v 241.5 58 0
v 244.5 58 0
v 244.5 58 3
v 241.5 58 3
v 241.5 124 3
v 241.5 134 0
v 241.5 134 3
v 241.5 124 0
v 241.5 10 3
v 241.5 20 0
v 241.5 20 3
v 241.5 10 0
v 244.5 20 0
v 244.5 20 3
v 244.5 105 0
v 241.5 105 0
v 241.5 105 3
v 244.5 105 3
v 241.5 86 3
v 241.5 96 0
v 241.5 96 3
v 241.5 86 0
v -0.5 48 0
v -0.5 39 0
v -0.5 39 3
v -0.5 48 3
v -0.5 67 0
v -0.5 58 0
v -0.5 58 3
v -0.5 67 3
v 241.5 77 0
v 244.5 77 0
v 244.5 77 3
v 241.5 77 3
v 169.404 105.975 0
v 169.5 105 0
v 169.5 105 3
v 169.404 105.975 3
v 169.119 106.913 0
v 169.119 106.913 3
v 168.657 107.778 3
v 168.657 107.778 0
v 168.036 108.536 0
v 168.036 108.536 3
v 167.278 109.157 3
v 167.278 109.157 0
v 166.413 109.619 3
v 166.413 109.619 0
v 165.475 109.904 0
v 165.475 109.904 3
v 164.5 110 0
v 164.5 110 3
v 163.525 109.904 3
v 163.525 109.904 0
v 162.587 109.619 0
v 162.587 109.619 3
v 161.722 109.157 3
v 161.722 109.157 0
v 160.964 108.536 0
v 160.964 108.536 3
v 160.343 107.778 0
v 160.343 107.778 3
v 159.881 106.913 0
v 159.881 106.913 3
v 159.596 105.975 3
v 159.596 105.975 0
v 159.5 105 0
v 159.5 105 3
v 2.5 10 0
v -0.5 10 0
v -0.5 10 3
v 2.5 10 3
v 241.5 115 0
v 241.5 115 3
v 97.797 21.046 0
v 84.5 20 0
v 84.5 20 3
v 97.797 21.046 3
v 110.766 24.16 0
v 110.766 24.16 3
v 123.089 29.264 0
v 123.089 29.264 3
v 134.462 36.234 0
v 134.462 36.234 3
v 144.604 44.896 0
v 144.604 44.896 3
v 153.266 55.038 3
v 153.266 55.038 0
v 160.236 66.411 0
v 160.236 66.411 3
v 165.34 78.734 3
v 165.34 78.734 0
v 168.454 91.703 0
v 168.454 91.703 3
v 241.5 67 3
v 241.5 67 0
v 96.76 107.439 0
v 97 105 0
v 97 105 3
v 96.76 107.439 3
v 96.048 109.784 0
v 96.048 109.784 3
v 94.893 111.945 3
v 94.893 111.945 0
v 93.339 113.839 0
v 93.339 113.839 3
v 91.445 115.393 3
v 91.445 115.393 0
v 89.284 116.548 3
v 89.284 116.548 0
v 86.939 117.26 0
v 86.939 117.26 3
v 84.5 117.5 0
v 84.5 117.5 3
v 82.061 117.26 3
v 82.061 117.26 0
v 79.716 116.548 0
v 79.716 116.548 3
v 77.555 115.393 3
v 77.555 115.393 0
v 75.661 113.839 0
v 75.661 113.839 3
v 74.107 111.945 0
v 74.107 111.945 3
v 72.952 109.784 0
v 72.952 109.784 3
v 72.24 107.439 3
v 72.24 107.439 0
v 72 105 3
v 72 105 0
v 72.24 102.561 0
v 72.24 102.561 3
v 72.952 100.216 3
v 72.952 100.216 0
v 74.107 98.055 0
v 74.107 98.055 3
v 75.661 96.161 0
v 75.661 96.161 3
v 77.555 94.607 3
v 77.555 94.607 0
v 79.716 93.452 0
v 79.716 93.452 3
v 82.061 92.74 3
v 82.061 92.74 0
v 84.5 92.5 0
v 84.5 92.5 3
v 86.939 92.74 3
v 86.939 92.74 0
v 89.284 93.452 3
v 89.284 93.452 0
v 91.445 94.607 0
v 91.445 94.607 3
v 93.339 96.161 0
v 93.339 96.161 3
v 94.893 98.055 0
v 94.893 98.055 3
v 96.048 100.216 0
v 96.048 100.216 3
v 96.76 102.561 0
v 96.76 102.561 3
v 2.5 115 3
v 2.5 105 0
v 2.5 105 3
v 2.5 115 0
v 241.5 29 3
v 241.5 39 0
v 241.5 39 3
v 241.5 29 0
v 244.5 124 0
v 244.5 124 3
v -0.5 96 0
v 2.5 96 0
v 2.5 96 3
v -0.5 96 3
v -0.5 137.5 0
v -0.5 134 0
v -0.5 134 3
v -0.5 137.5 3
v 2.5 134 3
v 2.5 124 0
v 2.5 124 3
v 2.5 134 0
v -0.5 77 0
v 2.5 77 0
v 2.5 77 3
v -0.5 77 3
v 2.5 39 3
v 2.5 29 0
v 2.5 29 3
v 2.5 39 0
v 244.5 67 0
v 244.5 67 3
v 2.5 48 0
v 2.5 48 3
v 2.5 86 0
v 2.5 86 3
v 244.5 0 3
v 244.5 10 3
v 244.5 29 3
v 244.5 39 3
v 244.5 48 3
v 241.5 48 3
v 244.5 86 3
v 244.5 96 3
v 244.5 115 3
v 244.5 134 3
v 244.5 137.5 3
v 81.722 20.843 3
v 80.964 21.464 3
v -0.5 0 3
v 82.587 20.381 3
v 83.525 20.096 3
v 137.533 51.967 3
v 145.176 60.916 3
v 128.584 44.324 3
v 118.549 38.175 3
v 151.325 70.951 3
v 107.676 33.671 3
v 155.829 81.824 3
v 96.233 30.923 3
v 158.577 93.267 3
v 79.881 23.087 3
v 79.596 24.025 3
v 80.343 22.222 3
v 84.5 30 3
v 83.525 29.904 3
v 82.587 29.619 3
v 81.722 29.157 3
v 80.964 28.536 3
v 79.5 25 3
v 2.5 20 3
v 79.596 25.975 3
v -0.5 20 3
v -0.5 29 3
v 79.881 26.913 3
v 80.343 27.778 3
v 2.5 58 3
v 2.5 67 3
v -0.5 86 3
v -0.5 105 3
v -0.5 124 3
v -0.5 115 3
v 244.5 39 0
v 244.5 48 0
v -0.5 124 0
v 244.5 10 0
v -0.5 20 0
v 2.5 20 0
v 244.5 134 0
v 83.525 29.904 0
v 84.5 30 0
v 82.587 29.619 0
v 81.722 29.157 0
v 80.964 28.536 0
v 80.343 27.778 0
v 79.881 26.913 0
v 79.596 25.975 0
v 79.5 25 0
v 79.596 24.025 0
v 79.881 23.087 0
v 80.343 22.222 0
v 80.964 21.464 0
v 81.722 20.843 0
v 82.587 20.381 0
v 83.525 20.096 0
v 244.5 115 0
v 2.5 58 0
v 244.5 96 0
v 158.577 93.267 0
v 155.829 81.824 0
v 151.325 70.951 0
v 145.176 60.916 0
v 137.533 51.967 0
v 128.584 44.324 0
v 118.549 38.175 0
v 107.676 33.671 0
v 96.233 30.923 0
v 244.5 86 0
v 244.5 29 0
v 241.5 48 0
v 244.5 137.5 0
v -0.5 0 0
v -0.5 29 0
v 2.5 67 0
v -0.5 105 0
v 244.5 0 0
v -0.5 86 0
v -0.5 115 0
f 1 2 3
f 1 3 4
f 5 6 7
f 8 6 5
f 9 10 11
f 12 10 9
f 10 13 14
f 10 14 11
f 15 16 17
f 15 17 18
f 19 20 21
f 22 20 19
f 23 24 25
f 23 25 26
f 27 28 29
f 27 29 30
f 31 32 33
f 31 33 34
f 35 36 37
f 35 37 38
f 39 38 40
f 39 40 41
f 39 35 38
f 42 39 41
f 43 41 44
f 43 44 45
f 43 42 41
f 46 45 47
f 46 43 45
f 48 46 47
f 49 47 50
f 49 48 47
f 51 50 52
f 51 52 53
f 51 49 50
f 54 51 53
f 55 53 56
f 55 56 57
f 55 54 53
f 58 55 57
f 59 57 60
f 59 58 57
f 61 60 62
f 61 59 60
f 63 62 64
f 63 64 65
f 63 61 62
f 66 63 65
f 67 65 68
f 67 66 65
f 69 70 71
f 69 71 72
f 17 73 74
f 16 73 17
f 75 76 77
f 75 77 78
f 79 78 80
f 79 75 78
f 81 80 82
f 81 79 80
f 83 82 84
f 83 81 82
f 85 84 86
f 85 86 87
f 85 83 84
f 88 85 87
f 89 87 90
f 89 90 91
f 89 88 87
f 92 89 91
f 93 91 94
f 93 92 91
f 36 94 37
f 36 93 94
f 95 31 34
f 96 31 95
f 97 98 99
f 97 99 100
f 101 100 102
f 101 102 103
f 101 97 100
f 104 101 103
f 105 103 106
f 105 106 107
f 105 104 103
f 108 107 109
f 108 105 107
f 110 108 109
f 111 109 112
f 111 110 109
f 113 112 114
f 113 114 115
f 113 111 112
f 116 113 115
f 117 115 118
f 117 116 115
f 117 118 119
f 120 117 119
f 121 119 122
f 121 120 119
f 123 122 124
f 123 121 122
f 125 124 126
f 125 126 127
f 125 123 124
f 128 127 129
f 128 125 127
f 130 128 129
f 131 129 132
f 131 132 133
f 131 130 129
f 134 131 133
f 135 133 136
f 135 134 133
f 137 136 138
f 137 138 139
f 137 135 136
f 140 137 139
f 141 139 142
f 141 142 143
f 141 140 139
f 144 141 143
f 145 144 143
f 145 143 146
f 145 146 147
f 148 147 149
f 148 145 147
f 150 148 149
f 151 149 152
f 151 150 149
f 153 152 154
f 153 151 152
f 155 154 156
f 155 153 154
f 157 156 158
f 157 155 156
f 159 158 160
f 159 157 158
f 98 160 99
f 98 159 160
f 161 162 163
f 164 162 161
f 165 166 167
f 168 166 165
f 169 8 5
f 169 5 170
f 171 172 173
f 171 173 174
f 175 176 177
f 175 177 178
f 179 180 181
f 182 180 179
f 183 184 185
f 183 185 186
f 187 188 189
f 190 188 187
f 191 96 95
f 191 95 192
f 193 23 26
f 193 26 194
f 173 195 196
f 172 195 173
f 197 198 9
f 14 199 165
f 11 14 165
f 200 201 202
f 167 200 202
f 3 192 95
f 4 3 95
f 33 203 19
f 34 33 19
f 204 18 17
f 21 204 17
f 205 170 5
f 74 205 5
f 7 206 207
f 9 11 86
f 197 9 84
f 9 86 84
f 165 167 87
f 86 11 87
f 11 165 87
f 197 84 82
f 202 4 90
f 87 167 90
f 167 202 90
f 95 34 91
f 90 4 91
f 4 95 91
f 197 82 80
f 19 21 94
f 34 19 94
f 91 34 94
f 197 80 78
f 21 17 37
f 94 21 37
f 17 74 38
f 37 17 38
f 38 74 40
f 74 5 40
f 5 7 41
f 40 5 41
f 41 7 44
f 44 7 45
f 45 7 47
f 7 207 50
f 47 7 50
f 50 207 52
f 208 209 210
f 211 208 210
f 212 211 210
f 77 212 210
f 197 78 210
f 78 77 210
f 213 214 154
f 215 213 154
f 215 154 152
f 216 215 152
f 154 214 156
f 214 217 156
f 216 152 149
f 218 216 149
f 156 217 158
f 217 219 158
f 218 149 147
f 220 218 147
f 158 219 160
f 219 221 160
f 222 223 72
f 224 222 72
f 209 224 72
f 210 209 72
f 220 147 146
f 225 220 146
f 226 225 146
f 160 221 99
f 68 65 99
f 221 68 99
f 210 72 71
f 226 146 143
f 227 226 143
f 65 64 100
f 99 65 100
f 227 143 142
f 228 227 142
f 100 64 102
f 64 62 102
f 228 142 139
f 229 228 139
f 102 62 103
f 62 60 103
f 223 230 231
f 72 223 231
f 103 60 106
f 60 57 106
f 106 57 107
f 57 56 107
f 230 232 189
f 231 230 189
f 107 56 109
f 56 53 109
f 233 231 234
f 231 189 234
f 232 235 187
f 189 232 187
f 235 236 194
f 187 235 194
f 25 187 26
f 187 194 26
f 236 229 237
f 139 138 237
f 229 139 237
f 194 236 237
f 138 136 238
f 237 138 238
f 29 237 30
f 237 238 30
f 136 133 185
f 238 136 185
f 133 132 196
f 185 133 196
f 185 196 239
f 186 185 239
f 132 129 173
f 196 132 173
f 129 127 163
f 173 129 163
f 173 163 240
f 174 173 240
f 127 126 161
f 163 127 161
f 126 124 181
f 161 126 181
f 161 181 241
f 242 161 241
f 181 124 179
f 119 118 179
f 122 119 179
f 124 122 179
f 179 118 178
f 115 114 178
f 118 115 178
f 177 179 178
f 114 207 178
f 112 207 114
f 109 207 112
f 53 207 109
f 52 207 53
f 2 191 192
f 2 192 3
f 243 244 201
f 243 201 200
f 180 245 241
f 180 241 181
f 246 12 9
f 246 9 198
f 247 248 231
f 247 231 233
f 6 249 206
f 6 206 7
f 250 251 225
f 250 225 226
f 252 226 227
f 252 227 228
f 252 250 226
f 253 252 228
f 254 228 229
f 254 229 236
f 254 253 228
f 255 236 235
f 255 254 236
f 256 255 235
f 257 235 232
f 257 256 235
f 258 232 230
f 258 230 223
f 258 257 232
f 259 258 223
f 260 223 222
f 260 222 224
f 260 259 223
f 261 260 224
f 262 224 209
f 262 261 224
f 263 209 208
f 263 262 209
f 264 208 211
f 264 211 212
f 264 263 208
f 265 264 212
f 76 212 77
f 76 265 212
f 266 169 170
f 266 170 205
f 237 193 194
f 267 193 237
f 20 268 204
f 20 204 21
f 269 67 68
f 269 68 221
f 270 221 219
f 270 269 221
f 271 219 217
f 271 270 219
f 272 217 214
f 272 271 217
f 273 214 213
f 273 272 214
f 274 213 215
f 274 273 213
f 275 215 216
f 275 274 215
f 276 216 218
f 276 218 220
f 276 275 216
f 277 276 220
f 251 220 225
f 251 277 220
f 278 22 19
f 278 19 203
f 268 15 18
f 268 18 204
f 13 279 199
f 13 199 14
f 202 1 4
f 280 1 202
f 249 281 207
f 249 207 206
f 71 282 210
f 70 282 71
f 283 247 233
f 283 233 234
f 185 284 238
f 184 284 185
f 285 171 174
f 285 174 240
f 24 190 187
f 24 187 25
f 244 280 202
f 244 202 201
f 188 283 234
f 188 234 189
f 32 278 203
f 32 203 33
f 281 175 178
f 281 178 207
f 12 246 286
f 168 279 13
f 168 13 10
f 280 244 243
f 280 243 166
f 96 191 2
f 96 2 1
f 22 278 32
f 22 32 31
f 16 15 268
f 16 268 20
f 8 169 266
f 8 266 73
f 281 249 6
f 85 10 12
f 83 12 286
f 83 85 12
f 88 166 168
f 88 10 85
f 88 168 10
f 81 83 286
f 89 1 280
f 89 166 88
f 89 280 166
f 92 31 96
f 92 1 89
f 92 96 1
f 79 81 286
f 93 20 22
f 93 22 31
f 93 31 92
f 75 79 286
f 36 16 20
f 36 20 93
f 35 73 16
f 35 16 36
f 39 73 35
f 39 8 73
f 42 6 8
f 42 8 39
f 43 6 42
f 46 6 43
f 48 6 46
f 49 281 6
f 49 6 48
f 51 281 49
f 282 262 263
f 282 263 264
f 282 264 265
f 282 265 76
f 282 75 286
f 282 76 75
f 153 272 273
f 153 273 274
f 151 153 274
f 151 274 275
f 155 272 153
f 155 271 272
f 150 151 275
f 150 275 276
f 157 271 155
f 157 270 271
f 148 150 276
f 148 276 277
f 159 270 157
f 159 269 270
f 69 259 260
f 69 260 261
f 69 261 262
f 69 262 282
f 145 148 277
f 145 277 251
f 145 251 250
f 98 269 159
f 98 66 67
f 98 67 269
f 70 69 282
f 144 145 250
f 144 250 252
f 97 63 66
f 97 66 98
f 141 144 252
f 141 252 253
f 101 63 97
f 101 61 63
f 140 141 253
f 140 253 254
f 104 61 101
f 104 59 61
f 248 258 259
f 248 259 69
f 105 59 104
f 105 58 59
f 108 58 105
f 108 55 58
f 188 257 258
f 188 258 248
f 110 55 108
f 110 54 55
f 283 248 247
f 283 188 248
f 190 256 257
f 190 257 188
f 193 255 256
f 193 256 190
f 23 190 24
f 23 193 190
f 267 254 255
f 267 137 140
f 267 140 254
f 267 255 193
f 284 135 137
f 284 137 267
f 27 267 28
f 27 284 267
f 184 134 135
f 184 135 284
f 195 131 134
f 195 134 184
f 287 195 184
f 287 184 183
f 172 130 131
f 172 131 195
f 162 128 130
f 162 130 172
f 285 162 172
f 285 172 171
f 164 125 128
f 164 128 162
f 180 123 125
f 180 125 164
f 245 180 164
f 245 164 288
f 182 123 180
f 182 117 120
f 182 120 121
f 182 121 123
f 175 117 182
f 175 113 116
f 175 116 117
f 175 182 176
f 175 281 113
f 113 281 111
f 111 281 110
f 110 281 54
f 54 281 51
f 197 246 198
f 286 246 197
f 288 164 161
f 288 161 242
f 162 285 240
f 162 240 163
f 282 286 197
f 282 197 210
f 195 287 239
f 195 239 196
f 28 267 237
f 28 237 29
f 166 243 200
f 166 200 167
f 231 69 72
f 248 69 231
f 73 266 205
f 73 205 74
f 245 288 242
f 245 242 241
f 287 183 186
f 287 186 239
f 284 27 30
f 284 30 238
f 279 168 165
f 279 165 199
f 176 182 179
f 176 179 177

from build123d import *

# Parameters (mm, degrees)
SKETCH1_R           = 12.5
BOSS_EXTRUDE1_DEPTH = 3


with BuildPart() as part:
    # Sketch1 → Boss-Extrude1 (new body)
    with BuildSketch(Plane.XY):
        Polygon((244.5, 137.5), (244.5, 134), (241.5, 134), (241.5, 124), (244.5, 124), (244.5, 115), (241.5, 115), (241.5, 105), (244.5, 105), (244.5, 96), (241.5, 96), (241.5, 86), (244.5, 86), (244.5, 77), (241.5, 77), (241.5, 67), (244.5, 67), (244.5, 58), (241.5, 58), (241.5, 48), (244.5, 48), (244.5, 39), (241.5, 39), (241.5, 29), (244.5, 29), (244.5, 20), (241.5, 20), (241.5, 10), (244.5, 10), (244.5, 0), (-0.5, 0), (-0.5, 10), (2.5, 10), (2.5, 20), (-0.5, 20), (-0.5, 29), (2.5, 29), (2.5, 39), (-0.5, 39), (-0.5, 48), (2.5, 48), (2.5, 58), (-0.5, 58), (-0.5, 67), (2.5, 67), (2.5, 77), (-0.5, 77), (-0.5, 86), (2.5, 86), (2.5, 96), (-0.5, 96), (-0.5, 105), (2.5, 105), (2.5, 115), (-0.5, 115), (-0.5, 124), (2.5, 124), (2.5, 134), (-0.5, 134), (-0.5, 137.5), align=None)
        with Locations((84.5, 105)):
            Circle(SKETCH1_R, mode=Mode.SUBTRACT)
        with BuildLine():
            ThreePointArc((169.5, 105), (164.5, 110), (159.5, 105))
            ThreePointArc((159.5, 105), (137.533008589, 51.966991411), (84.5, 30))
            ThreePointArc((84.5, 30), (79.5, 25), (84.5, 20))
            ThreePointArc((84.5, 20), (144.604076401, 44.895923599), (169.5, 105))
        make_face(mode=Mode.SUBTRACT)
    extrude(amount=BOSS_EXTRUDE1_DEPTH)


solid = part.part
